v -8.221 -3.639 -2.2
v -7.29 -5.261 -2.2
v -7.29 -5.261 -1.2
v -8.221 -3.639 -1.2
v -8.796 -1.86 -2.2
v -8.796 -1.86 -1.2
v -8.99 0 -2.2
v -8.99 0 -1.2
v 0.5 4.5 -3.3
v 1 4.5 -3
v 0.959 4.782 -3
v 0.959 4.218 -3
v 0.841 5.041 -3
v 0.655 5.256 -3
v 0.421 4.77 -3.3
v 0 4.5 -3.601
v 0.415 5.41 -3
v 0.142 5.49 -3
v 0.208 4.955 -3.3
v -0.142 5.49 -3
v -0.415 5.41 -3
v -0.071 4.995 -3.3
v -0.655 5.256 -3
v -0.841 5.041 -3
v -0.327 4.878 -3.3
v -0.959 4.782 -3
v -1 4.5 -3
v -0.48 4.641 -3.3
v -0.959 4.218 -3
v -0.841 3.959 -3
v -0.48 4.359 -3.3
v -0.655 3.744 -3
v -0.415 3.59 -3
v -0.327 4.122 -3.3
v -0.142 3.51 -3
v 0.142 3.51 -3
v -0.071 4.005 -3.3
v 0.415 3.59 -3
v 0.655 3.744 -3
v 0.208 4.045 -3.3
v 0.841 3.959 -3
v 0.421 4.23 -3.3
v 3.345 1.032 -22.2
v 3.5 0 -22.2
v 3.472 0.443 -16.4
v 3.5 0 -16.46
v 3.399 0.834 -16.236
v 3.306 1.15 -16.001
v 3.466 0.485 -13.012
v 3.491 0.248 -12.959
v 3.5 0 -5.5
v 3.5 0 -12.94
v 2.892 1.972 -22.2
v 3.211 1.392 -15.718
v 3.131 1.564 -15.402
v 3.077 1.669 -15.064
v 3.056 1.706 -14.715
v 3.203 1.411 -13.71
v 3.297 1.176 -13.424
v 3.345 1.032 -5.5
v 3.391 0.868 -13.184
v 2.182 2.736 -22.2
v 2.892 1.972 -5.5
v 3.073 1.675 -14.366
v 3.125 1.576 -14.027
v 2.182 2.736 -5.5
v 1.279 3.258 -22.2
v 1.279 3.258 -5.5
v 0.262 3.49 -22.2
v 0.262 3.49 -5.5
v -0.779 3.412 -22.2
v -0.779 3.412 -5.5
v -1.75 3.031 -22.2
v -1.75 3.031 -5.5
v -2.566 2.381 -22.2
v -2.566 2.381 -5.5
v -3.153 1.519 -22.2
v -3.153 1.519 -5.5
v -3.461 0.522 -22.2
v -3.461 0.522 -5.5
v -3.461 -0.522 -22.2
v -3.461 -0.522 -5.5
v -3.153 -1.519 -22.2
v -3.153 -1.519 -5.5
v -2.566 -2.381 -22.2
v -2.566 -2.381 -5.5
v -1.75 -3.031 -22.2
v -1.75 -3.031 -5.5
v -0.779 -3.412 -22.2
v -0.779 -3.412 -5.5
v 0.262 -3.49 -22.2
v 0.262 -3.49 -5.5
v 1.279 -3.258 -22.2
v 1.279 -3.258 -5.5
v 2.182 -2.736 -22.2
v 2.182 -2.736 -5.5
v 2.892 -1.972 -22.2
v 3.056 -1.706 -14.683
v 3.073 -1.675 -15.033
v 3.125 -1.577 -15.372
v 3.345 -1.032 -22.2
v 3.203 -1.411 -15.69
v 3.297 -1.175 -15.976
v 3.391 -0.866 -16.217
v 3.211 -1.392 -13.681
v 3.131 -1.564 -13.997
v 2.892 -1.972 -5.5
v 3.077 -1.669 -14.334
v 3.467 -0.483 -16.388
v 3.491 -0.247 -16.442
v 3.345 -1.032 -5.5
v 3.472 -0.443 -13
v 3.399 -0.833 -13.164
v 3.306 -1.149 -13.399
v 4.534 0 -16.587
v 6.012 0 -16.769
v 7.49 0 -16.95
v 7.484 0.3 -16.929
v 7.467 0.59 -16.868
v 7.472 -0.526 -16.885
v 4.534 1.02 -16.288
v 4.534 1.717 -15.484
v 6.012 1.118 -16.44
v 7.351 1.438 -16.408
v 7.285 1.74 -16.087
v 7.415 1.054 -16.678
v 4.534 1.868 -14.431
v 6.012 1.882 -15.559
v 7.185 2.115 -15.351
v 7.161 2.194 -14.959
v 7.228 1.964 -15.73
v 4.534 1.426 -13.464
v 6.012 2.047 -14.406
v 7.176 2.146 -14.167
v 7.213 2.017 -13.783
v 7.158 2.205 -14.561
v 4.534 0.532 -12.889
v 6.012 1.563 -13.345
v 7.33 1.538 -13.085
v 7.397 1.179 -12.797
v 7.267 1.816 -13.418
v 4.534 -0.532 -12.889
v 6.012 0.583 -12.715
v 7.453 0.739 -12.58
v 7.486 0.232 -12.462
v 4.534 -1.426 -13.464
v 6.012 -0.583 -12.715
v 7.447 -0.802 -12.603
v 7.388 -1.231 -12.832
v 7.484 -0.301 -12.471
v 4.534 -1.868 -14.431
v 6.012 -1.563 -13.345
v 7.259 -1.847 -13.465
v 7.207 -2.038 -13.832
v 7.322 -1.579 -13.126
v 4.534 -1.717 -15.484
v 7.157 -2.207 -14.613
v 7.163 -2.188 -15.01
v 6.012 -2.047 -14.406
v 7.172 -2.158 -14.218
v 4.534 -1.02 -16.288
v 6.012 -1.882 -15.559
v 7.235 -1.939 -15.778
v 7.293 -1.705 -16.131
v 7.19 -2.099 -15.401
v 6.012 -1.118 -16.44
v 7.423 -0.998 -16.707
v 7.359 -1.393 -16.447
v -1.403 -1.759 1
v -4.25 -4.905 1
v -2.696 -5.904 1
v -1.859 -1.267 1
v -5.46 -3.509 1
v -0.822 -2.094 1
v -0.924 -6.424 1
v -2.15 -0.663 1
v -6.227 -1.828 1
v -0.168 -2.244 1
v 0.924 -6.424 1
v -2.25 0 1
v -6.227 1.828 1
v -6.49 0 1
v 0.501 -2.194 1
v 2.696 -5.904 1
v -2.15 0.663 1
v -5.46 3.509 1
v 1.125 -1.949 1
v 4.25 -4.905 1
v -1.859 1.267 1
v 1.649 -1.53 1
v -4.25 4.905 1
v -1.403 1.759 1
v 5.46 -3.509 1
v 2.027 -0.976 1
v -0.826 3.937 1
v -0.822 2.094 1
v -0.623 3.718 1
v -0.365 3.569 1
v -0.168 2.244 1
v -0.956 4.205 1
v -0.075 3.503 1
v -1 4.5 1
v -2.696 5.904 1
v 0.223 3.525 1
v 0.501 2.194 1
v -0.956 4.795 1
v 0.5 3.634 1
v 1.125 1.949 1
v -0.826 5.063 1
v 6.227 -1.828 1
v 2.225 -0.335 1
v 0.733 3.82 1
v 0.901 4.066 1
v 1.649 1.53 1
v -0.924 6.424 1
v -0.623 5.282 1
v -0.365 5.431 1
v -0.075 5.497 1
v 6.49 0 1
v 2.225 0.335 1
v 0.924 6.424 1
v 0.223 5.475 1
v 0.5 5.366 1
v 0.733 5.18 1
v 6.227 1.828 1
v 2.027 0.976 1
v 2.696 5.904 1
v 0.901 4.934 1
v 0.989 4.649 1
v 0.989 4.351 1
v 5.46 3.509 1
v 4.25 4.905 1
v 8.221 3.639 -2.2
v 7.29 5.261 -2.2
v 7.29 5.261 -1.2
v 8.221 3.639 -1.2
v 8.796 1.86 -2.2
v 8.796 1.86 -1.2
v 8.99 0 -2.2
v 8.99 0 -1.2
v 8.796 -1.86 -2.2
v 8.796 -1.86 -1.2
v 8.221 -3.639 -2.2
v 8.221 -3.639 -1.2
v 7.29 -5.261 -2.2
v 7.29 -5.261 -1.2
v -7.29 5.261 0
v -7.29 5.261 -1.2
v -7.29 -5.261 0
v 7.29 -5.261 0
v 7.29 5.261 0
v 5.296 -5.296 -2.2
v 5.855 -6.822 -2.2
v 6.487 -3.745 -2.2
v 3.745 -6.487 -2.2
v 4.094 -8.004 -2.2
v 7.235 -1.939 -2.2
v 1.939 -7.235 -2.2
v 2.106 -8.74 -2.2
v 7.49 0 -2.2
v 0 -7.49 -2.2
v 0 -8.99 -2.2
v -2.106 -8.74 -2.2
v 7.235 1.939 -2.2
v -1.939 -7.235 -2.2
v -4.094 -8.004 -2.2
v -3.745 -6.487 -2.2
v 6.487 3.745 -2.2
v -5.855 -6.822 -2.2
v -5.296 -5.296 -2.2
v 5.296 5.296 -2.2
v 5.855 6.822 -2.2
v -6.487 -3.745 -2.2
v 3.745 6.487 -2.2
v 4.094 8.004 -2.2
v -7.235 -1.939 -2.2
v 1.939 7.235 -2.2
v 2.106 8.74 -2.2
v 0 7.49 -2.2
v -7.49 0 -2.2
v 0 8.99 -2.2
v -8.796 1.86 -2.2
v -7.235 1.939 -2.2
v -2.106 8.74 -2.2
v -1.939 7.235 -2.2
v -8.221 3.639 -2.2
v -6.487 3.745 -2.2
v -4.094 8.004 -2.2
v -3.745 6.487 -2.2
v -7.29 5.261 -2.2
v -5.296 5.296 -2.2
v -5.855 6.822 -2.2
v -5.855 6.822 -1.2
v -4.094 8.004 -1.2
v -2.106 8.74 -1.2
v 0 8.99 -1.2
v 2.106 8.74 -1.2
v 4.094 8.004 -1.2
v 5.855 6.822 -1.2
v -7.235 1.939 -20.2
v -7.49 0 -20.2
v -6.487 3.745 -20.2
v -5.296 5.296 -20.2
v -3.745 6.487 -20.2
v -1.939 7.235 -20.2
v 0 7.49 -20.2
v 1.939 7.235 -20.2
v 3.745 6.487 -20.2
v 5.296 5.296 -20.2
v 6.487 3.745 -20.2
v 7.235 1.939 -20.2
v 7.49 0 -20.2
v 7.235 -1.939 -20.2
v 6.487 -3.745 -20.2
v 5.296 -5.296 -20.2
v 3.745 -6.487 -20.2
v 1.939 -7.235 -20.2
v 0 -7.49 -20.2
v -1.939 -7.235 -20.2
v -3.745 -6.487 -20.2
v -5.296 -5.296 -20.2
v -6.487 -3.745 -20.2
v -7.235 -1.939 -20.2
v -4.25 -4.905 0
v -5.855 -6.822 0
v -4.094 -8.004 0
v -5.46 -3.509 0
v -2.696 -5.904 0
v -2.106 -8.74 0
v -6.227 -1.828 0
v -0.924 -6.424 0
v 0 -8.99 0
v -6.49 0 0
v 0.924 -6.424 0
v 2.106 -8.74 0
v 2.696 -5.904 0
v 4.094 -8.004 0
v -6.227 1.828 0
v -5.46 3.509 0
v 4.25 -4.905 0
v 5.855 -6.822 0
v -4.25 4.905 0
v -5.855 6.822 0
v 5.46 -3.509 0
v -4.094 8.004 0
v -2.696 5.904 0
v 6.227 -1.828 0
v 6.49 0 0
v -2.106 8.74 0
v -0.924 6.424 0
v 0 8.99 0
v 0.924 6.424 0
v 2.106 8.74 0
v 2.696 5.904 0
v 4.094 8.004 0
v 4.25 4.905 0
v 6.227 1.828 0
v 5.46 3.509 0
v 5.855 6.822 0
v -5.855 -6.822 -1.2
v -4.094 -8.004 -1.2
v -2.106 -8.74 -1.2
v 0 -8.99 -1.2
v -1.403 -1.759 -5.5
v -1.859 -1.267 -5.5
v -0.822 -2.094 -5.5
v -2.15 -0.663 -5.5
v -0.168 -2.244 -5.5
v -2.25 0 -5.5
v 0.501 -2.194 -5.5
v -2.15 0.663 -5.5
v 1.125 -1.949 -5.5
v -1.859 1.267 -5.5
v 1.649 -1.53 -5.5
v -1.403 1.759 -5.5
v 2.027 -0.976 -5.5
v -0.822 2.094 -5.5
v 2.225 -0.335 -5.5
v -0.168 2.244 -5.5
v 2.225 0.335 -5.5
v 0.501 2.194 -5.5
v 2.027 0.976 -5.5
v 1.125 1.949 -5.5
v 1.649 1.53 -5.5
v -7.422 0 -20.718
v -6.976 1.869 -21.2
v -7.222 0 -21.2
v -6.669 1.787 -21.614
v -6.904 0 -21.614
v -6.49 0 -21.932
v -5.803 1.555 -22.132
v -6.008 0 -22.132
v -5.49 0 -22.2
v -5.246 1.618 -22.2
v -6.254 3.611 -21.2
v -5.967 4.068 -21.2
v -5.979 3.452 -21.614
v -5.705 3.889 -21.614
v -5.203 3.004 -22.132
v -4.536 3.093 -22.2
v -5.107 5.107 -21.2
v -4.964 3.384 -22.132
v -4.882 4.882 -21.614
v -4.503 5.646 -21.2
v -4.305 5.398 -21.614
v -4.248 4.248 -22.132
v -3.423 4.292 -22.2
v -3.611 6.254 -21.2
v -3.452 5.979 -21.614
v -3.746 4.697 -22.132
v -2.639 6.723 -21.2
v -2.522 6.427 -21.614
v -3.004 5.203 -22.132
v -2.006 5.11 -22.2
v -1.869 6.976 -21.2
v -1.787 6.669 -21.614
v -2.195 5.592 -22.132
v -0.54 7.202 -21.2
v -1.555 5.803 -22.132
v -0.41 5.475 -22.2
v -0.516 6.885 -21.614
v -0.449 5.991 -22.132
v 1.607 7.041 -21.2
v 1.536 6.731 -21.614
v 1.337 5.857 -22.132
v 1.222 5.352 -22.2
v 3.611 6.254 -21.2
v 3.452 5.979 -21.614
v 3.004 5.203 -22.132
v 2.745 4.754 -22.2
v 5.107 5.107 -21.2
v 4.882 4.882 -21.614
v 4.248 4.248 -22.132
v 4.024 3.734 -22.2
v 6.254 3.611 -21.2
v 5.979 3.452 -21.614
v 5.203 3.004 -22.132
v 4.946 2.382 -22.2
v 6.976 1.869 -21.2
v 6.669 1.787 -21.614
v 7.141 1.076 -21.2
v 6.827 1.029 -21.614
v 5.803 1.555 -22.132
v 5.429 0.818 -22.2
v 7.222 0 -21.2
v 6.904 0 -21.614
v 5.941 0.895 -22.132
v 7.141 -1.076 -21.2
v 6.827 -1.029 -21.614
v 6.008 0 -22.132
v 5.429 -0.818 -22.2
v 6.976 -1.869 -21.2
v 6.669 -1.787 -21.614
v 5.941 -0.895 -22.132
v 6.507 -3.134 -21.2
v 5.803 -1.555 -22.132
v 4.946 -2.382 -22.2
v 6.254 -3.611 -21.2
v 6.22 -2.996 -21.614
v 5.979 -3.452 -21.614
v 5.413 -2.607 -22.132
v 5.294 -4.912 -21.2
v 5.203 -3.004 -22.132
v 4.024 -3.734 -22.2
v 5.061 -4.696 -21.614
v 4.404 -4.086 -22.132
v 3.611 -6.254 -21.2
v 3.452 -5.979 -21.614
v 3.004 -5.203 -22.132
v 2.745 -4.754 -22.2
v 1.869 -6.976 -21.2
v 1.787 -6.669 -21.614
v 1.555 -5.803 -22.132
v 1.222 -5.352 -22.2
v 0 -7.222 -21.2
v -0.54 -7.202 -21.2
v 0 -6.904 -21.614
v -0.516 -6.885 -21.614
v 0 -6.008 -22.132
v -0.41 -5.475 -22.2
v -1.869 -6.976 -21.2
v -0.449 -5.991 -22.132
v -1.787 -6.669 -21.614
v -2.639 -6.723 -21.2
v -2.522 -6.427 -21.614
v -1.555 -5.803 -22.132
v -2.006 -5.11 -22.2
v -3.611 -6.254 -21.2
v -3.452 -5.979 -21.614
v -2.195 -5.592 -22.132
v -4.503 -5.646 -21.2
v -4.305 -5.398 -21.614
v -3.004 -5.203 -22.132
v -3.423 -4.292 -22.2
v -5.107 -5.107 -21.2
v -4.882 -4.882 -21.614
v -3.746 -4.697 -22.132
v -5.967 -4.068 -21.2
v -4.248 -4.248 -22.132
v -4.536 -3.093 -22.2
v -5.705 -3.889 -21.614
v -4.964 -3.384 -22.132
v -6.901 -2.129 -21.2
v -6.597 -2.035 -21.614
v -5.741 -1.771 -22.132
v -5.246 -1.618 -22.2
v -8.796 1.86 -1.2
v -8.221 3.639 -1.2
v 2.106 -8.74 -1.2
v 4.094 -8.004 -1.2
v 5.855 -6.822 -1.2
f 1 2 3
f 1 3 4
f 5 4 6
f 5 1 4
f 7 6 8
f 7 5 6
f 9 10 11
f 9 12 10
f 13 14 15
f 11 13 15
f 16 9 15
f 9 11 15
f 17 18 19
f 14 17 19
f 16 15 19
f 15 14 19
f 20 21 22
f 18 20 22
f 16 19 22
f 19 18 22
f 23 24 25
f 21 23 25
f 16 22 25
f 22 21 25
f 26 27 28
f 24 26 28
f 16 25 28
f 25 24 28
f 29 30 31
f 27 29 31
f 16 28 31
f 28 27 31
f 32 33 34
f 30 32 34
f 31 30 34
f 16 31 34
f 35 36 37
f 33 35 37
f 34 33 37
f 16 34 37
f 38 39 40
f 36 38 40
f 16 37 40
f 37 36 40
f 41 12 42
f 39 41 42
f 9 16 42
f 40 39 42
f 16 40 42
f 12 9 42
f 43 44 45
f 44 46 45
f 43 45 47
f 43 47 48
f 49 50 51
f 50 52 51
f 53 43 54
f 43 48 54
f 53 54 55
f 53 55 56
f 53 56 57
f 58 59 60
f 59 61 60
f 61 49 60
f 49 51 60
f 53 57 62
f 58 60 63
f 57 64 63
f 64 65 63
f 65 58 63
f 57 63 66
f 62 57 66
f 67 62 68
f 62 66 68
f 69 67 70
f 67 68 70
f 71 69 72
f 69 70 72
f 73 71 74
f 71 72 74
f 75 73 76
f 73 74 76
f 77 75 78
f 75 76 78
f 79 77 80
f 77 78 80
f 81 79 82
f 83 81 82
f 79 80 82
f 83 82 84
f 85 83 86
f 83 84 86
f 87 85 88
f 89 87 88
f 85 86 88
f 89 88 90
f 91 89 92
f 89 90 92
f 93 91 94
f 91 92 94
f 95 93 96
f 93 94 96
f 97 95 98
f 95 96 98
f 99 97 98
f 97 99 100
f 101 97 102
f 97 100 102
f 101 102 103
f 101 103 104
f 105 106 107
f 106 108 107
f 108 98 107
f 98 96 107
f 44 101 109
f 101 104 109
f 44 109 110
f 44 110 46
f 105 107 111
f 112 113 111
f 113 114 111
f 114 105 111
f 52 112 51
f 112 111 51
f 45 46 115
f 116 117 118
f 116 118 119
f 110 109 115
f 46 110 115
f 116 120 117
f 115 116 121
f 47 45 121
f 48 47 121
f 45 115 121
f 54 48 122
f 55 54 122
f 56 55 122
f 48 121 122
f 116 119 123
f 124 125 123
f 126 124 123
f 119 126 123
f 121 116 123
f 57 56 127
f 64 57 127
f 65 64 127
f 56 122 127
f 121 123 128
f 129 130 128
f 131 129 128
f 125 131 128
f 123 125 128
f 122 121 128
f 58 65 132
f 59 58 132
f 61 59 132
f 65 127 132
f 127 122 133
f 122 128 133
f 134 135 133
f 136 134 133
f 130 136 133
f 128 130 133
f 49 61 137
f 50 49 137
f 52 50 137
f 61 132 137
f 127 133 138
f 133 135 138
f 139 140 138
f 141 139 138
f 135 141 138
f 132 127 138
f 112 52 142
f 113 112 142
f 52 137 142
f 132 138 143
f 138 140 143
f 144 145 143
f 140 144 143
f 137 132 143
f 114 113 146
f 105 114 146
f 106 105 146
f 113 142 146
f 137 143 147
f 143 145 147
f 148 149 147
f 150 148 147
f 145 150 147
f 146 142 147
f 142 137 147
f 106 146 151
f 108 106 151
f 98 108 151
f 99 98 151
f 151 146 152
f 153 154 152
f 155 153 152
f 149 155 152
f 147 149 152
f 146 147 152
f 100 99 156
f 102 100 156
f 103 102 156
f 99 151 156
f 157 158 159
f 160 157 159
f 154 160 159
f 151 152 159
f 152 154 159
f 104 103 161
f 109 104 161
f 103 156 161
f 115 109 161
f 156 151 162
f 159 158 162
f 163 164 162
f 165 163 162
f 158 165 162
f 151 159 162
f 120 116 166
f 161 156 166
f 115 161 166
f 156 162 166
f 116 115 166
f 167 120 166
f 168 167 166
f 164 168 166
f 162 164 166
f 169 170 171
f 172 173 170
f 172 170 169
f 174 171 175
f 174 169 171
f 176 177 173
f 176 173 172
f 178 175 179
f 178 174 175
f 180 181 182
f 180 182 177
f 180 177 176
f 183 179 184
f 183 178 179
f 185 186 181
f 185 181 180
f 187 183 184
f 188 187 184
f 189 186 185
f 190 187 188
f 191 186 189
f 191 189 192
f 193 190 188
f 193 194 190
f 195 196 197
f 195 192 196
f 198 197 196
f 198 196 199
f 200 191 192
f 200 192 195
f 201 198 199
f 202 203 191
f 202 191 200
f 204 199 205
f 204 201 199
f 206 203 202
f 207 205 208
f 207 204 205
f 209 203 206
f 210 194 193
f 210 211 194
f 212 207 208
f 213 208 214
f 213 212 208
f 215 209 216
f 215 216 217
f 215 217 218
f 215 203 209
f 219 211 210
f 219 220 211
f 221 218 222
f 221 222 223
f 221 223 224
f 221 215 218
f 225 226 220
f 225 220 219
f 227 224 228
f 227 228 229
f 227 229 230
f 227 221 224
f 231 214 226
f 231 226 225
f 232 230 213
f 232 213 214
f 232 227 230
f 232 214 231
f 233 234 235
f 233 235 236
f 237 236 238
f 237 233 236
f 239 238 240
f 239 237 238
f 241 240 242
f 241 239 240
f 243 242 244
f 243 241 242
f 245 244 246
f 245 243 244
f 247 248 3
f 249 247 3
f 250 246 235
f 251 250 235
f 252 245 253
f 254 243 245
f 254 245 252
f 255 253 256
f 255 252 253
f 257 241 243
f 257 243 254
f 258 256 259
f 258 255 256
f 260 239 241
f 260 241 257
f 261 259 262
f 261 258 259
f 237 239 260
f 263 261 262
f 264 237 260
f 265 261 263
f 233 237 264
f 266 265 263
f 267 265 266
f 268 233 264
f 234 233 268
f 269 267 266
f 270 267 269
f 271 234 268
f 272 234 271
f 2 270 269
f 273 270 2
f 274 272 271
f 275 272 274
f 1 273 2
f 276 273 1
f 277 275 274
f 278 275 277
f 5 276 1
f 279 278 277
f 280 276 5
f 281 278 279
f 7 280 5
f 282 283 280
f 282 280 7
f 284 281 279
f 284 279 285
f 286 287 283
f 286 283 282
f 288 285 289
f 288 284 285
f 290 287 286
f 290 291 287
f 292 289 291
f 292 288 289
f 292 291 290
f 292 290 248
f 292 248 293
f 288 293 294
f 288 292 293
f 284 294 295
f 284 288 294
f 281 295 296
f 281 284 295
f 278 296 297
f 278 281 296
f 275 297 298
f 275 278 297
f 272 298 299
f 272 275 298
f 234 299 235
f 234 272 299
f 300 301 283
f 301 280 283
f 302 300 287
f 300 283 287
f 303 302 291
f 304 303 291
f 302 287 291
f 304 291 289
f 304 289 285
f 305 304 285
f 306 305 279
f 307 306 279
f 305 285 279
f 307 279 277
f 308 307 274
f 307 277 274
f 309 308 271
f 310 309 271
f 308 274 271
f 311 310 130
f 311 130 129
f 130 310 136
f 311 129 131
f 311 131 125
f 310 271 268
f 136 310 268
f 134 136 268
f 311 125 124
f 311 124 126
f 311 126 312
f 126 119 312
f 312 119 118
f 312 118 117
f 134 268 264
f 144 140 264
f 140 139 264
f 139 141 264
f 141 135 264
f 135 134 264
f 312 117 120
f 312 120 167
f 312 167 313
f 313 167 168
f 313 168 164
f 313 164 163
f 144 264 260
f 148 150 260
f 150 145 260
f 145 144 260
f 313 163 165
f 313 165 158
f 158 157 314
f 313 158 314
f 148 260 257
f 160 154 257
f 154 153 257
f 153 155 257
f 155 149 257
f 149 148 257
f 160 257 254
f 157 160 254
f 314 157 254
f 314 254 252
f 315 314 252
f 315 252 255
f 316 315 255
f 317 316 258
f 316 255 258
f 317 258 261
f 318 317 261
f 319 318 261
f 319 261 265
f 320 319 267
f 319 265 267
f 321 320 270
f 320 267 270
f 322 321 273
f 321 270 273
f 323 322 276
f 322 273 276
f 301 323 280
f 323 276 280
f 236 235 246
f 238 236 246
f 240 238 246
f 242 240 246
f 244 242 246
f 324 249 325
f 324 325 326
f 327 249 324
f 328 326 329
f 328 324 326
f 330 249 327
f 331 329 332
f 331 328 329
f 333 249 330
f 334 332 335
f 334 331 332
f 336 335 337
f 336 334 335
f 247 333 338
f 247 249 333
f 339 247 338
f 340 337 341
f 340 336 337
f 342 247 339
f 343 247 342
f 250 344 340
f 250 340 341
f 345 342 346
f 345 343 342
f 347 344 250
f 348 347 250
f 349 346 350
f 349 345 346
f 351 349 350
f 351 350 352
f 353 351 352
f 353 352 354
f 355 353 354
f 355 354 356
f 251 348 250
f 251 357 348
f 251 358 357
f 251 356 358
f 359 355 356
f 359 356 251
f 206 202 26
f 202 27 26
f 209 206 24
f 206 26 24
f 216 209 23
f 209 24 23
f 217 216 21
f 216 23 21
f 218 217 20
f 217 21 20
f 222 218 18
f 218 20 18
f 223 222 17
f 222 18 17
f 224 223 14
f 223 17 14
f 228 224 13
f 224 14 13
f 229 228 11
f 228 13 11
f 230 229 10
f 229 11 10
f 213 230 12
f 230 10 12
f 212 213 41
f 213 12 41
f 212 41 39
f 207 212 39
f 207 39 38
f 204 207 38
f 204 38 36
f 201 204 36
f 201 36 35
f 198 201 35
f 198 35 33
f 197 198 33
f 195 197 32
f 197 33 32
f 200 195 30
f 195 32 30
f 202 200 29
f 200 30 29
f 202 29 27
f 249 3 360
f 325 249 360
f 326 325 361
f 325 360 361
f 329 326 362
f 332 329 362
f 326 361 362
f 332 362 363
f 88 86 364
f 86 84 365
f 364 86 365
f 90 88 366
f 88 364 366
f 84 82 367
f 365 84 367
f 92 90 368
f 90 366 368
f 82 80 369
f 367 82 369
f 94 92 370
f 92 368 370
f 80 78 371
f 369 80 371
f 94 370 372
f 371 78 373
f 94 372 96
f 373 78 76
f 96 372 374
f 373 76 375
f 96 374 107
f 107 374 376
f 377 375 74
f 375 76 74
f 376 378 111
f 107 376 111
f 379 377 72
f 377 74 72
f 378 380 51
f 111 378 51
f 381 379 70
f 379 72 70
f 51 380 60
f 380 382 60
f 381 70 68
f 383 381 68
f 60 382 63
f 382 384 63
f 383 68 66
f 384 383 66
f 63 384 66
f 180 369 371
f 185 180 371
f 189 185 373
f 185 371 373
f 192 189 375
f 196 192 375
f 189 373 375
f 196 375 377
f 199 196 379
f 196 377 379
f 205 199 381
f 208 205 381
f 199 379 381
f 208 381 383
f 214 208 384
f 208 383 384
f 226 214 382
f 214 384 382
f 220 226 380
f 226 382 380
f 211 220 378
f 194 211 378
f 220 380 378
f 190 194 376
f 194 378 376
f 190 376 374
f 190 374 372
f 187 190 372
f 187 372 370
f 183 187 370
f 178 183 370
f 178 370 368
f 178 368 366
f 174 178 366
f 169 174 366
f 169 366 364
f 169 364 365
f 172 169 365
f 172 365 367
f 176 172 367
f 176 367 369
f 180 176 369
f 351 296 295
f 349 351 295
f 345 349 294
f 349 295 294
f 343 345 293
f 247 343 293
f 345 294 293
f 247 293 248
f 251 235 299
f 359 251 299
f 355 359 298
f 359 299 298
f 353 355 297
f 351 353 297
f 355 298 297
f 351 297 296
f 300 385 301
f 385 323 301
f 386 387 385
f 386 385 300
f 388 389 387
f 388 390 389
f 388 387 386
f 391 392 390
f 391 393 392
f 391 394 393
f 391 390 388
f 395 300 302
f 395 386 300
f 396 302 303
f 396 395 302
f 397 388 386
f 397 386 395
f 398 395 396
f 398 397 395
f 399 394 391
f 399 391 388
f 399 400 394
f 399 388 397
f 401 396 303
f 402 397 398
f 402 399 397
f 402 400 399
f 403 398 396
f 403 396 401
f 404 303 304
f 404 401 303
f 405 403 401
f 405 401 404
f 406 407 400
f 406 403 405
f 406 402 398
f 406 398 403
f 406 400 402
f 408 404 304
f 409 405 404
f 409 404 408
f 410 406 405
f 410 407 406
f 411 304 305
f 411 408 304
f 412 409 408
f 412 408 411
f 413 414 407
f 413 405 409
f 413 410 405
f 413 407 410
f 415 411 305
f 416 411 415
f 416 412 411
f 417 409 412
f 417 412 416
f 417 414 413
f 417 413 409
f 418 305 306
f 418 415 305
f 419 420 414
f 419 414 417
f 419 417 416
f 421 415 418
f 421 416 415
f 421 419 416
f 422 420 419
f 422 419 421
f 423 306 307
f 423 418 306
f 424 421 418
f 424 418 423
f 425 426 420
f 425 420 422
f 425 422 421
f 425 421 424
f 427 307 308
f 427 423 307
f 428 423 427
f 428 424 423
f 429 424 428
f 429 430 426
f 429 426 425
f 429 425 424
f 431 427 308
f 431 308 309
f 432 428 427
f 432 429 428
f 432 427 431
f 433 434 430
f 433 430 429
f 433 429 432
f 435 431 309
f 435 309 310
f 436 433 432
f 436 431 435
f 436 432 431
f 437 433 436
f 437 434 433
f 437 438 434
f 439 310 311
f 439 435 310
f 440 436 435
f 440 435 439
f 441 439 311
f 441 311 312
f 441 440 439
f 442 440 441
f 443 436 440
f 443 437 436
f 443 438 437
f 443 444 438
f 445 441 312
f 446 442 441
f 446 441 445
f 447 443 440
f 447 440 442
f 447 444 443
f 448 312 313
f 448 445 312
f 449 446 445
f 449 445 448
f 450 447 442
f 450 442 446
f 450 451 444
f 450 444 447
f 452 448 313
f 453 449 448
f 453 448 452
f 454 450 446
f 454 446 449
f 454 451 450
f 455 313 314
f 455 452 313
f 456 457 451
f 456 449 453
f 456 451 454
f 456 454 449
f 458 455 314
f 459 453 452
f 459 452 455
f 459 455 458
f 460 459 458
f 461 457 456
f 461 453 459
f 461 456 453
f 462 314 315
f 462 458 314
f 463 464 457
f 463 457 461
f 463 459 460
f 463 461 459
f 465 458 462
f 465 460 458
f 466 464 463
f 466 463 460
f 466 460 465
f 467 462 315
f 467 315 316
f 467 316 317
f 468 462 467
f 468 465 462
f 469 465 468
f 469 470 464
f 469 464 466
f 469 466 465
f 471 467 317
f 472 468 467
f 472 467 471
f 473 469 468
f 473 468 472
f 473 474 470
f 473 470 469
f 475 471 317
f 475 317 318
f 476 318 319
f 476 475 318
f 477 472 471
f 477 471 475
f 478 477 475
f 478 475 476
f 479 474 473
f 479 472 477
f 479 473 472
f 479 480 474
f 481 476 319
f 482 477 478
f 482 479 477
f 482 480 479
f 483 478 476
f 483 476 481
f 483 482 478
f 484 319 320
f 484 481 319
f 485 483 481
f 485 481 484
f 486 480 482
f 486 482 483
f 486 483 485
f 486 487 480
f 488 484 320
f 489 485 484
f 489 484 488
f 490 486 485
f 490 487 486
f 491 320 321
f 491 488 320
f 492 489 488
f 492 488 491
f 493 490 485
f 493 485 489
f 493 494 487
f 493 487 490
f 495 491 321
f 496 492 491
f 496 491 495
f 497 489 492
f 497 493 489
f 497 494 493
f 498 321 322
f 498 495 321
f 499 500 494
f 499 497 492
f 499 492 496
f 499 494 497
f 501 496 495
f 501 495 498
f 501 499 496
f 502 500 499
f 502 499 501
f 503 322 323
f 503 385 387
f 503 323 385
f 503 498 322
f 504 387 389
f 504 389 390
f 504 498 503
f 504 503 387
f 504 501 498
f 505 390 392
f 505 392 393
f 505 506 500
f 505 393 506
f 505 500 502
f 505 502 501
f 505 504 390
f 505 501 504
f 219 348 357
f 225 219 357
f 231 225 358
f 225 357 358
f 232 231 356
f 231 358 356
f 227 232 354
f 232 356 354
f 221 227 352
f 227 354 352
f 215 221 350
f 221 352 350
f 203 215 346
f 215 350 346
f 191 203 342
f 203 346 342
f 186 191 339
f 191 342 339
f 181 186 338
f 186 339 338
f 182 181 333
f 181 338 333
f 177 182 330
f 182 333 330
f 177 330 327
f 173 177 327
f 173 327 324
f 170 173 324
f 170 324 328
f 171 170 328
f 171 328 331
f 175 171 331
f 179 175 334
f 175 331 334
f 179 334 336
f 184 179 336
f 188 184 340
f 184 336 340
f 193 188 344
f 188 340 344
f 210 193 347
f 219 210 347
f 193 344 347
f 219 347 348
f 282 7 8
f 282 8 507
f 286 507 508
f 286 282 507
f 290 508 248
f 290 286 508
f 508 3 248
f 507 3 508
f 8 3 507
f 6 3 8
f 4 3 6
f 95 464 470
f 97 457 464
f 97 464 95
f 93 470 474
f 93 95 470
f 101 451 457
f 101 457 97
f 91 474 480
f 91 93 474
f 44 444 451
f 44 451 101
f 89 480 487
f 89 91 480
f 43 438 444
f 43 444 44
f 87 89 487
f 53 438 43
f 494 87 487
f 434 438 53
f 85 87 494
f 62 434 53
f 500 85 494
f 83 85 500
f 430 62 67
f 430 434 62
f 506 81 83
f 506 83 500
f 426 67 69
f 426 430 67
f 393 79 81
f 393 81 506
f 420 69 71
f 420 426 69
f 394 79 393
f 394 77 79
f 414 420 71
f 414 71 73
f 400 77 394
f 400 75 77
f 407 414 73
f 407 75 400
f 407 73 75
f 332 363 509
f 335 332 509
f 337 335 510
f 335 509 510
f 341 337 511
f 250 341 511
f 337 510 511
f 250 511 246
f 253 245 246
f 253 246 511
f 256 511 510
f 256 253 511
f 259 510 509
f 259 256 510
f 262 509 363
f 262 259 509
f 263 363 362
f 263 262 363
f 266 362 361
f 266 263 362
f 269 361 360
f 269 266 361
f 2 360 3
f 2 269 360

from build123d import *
from build123d.topology import SkipClean

# Parameters (mm, degrees)
SKETCH1_R                    = 6.49
BOSS_EXTRUDE1_DEPTH          = 1
BOSS_EXTRUDE2_DEPTH          = 1.2
SKETCH2_R                    = 8.99
BOSS_EXTRUDE3_DEPTH          = 1
SKETCH3_R                    = 7.49
BOSS_EXTRUDE4_DEPTH          = 20
F_7_0_7_DIAMETER_HOLE1_D     = 7
F_7_0_7_DIAMETER_HOLE1_DEPTH = 16.7
F_2_0MM_DOWEL_HOLE1_D        = 2
F_2_0MM_DOWEL_HOLE1_DEPTH    = 4
F_2_0MM_DOWEL_HOLE1_TIP      = 0.600860619
FILLET1_R                    = 2
F_4_5_4_5_DIAMETER_HOLE2_D   = 4.5
CUT_EXTRUDE2_REACH           = 31.073
CUT_EXTRUDE2_END_RADIUS      = 3.5
CUT_EXTRUDE2_DRAFT           = -7


with BuildPart() as part:
    # Sketch1 → Boss-Extrude1 (new body)
    with BuildSketch(Plane.XY):
        Circle(SKETCH1_R)
    extrude(amount=BOSS_EXTRUDE1_DEPTH)

    # Sketch1<3> → Boss-Extrude2 (add)
    with BuildSketch(Plane.XY):
        with BuildLine():
            ThreePointArc((-7.29, -5.260798418), (0, -8.99), (7.29, -5.260798418))
            Line((7.29, -5.260798418), (7.29, 5.260798418))
            ThreePointArc((7.29, 5.260798418), (0, 8.99), (-7.29, 5.260798418))
            Line((-7.29, 5.260798418), (-7.29, -5.260798418))
        make_face()
    extrude(amount=-BOSS_EXTRUDE2_DEPTH)

    # Sketch2 → Boss-Extrude3 (add)
    with SkipClean():  # the faces are left unmerged after this step: merging them gives an invalid solid
        with BuildSketch(Plane(origin=(0, 0, -1.2), x_dir=(-1, 0, 0), z_dir=(0, 0, -1))):
            Circle(SKETCH2_R)
        extrude(amount=BOSS_EXTRUDE3_DEPTH)

    # Sketch3 → Boss-Extrude4 (add)
    with SkipClean():  # the faces are left unmerged after this step: merging them gives an invalid solid
        with BuildSketch(Plane(origin=(0, 0, -2.2), x_dir=(-1, 0, 0), z_dir=(0, 0, -1))):
            Circle(SKETCH3_R)
        extrude(amount=BOSS_EXTRUDE4_DEPTH)

    # Ø7.0 (7) Diameter Hole1
    with Locations(Plane(origin=(0, 0, -22.2), x_dir=(-1, 0, 0), z_dir=(0, 0, -1))):
        with Locations((0, 0)):
            Hole(F_7_0_7_DIAMETER_HOLE1_D / 2, depth=F_7_0_7_DIAMETER_HOLE1_DEPTH)

    # Ø2.0mm Dowel Hole1
    with Locations(Plane.XY.offset(1)):
        with Locations((0, 4.5)):
            Hole(F_2_0MM_DOWEL_HOLE1_D / 2, depth=F_2_0MM_DOWEL_HOLE1_DEPTH)
            with Locations((0, 0, -(F_2_0MM_DOWEL_HOLE1_DEPTH + F_2_0MM_DOWEL_HOLE1_TIP / 2))):  # 118° drill point
                Cone(0, F_2_0MM_DOWEL_HOLE1_D / 2, F_2_0MM_DOWEL_HOLE1_TIP, mode=Mode.SUBTRACT)

    # Fillet1
    fillet1_edges = [part.edges().sort_by_distance(p)[0] for p in [
        (7.49, 0, -22.2),
    ]]
    fillet(fillet1_edges, radius=FILLET1_R)

    # Ø4.5 (4.5) Diameter Hole2 (through all)
    with Locations(Plane.XY.offset(1)):
        with Locations((0, 0)):
            Hole(F_4_5_4_5_DIAMETER_HOLE2_D / 2)

    # Cut-Extrude2: up to this cylinder (the profile starts outside it)
    with SkipClean():  # the faces are left unmerged after this step: merging them gives an invalid solid
        cut_extrude2_end = Plane(origin=(0, 0, -14.7), z_dir=(0, 0, -1)) * Cylinder(CUT_EXTRUDE2_END_RADIUS, 70.146, mode=Mode.PRIVATE)



with BuildPart() as cut_extrude2_long_prism_1:
    # Sketch10 → Cut-Extrude2 (the long prism of profile 1, to be tilted and cut off)
    with SkipClean():  # the faces are left unmerged after this step: merging them gives an invalid solid
        with BuildSketch(Plane(origin=(7.49, 0, 0), x_dir=(0, 0, -1), z_dir=(1, 0, 0))):
            with BuildLine():
                ThreePointArc((16.95, 0), (16.290990258, 1.590990258), (14.7, 2.25))
                ThreePointArc((14.7, 2.25), (12.45, 0), (14.7, -2.25))
                ThreePointArc((14.7, -2.25), (16.290990258, -1.590990258), (16.95, 0))
            make_face()
        extrude(amount=-CUT_EXTRUDE2_REACH)
        cut_extrude2_tool1_sides = [cut_extrude2_long_prism_1.faces().sort_by_distance(p)[0] for p in [
            (-8.0465, 2.25, -14.7),
        ]]
        draft(cut_extrude2_tool1_sides, Plane(origin=(7.49, 0, 0), x_dir=(0, 0, -1), z_dir=(1, 0, 0)), CUT_EXTRUDE2_DRAFT)  # the draft: side faces tilted about the start plane


with BuildPart() as part_1:
    with SkipClean():  # the faces are left unmerged after this step: merging them gives an invalid solid
        add(part.part)
        cut_extrude2_tool1 = cut_extrude2_long_prism_1.part - cut_extrude2_end
        add(cut_extrude2_tool1.solids().sort_by_distance((7.49, 0, -14.7))[0], mode=Mode.SUBTRACT)


solid = part_1.part
